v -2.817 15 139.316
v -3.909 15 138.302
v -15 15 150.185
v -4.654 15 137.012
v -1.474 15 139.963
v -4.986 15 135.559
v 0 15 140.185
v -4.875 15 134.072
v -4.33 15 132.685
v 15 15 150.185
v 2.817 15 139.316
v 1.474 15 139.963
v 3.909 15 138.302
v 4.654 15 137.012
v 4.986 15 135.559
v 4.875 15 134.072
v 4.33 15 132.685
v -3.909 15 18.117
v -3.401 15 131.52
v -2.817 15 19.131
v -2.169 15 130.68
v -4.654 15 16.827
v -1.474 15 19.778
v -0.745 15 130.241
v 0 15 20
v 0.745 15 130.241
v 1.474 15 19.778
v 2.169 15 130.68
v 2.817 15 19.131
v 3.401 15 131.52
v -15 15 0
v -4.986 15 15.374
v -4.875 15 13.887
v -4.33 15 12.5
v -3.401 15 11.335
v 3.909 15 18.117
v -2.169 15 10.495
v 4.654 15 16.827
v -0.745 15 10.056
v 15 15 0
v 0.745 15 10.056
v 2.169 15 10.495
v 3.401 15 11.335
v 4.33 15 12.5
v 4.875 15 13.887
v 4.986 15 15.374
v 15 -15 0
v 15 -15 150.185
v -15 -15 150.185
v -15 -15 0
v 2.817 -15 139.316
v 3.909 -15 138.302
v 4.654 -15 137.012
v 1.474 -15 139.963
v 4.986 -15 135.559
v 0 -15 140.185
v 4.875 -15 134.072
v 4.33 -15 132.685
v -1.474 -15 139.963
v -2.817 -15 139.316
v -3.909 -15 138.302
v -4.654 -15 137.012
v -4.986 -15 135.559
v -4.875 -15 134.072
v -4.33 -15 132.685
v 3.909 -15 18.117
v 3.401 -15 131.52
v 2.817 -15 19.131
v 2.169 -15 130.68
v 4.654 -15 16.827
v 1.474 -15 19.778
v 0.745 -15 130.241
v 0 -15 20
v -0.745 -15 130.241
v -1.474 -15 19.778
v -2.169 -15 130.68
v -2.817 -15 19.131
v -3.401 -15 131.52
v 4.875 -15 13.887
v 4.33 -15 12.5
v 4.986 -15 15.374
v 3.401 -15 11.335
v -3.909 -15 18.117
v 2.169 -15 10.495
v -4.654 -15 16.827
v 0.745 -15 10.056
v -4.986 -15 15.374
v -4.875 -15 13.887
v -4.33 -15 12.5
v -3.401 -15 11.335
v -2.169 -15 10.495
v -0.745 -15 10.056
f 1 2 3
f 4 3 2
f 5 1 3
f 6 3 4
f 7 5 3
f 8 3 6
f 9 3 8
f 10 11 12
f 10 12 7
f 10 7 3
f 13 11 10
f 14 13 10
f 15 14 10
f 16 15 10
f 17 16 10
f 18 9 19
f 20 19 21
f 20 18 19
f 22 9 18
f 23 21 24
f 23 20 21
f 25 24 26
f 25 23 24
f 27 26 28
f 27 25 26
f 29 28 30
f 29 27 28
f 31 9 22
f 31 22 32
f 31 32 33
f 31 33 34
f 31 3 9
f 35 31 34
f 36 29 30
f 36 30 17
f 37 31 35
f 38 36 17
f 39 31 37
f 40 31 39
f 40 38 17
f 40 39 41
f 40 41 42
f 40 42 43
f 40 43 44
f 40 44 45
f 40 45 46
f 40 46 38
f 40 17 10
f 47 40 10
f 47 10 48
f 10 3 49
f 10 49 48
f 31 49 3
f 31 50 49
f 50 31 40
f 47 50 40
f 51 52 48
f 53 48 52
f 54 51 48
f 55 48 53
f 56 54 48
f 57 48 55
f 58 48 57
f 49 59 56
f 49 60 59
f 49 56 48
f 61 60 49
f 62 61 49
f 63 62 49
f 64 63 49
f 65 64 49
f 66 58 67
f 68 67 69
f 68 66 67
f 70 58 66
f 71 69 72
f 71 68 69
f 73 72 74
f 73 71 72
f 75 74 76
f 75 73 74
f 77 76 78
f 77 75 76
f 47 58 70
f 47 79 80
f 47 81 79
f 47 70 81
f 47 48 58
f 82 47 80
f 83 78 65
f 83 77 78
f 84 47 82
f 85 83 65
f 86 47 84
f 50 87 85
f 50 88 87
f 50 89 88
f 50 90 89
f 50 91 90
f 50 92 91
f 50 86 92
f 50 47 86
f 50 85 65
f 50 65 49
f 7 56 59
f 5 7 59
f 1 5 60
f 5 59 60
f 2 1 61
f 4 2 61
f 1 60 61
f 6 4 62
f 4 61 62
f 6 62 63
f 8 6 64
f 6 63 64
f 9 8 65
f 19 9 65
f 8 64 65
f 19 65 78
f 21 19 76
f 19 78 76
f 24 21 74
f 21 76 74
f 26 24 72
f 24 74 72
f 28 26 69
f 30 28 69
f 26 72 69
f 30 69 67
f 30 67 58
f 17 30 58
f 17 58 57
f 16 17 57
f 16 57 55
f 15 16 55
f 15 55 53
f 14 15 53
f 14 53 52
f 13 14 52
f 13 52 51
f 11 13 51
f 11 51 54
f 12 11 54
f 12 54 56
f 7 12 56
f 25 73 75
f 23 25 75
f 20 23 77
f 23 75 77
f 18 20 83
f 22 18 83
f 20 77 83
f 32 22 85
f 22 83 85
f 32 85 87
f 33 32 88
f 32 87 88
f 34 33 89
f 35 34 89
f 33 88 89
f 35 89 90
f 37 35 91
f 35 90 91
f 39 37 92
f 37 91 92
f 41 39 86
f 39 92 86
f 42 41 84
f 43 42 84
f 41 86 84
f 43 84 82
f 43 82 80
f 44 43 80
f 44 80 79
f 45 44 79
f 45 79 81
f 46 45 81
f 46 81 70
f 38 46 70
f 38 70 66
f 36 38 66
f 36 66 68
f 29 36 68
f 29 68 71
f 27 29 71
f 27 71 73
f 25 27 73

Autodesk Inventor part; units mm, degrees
ref_plane "YZ Plane" through (0, 0, 0) normal (1, 0, 0) x (0, 1, 0)
ref_plane "XZ Plane" through (0, 0, 0) normal (0, 1, 0) x (-1, 0, 0)
ref_plane "XY Plane" through (0, 0, 0) normal (0, 0, 1) x (1, 0, 0)
sketch "スケッチ4" plane through (0, 0, 0) normal (0, 0, 1) x (1, 0, 0)
  line L0 (-15, 15) -> (15, 15)
  line L1 (15, 15) -> (15, -15)
  line L2 (15, -15) -> (-15, -15)
  line L3 (-15, -15) -> (-15, 15)
  line L4 (-15, 15) -> (15, -15) construction
  line L5 (15, 15) -> (-15, -15) construction
  point P0 (0, 0)
  dimension "d14" = 30
  dimension "d15" = 30
extrude "押し出し2" add sketch "スケッチ4" along normal blind 150.185
sketch "スケッチ5" plane through (-15, 15, 0) normal (0, 1, 0) x (1, 0, 0)
  line L0 (30, -150.185) -> (0, -150.185) projected
  line L1 (0, 0) -> (30, 0) projected
  point P0 (15, 0)
  point P1 (15, -135.185)
  point P2 (15, -15)
  dimension "d18" = 15
  dimension "d19" = 15
hole "穴2" at (0, 15, 135.185) at (0, 15, 15) direction (0, -1, 0) diameter 10 end through all
